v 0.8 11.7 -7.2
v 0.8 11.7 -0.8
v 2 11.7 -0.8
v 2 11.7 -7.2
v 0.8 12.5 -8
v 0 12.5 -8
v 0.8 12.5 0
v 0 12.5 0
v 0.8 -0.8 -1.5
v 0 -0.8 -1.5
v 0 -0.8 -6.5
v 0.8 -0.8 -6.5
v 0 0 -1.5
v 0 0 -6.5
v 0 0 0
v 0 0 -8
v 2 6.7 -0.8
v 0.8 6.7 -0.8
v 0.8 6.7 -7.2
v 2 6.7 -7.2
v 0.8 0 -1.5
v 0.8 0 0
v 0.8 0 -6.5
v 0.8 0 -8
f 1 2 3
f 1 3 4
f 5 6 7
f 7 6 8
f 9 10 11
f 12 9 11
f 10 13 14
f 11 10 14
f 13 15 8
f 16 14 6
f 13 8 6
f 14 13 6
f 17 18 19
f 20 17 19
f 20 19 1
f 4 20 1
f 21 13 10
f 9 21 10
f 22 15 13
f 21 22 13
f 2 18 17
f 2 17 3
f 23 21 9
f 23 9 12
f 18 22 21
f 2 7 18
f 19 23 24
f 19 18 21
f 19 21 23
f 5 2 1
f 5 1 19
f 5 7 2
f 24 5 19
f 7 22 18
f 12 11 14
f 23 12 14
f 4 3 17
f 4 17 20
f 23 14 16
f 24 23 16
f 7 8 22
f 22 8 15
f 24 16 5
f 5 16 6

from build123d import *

# Parameters (mm, degrees)
RESSALTO_EXTRUS_O1_DEPTH = 0.8
ESBO_O2_W                = 6.4
ESBO_O2_H                = 5
RESSALTO_EXTRUS_O2_DEPTH = 1.2


with BuildPart() as part:
    # Esboço1 → Ressalto-extrusão1 (new body)
    with BuildSketch(Plane(origin=(0, 0, 0), x_dir=(0, 0, -1), z_dir=(1, 0, 0))):
        Polygon((0, 0), (1.5, 0), (1.5, -0.8), (6.5, -0.8), (6.5, 0), (8, 0), (8, 12.5), (0, 12.5), align=None)
    extrude(amount=RESSALTO_EXTRUS_O1_DEPTH)

    # Esboço2 → Ressalto-extrusão2 (add)
    with BuildSketch(Plane(origin=(0.8, 0, 0), x_dir=(0, 0, -1), z_dir=(1, 0, 0))):
        with Locations((4, 9.2)):
            Rectangle(ESBO_O2_W, ESBO_O2_H)
    extrude(amount=RESSALTO_EXTRUS_O2_DEPTH)


solid = part.part
